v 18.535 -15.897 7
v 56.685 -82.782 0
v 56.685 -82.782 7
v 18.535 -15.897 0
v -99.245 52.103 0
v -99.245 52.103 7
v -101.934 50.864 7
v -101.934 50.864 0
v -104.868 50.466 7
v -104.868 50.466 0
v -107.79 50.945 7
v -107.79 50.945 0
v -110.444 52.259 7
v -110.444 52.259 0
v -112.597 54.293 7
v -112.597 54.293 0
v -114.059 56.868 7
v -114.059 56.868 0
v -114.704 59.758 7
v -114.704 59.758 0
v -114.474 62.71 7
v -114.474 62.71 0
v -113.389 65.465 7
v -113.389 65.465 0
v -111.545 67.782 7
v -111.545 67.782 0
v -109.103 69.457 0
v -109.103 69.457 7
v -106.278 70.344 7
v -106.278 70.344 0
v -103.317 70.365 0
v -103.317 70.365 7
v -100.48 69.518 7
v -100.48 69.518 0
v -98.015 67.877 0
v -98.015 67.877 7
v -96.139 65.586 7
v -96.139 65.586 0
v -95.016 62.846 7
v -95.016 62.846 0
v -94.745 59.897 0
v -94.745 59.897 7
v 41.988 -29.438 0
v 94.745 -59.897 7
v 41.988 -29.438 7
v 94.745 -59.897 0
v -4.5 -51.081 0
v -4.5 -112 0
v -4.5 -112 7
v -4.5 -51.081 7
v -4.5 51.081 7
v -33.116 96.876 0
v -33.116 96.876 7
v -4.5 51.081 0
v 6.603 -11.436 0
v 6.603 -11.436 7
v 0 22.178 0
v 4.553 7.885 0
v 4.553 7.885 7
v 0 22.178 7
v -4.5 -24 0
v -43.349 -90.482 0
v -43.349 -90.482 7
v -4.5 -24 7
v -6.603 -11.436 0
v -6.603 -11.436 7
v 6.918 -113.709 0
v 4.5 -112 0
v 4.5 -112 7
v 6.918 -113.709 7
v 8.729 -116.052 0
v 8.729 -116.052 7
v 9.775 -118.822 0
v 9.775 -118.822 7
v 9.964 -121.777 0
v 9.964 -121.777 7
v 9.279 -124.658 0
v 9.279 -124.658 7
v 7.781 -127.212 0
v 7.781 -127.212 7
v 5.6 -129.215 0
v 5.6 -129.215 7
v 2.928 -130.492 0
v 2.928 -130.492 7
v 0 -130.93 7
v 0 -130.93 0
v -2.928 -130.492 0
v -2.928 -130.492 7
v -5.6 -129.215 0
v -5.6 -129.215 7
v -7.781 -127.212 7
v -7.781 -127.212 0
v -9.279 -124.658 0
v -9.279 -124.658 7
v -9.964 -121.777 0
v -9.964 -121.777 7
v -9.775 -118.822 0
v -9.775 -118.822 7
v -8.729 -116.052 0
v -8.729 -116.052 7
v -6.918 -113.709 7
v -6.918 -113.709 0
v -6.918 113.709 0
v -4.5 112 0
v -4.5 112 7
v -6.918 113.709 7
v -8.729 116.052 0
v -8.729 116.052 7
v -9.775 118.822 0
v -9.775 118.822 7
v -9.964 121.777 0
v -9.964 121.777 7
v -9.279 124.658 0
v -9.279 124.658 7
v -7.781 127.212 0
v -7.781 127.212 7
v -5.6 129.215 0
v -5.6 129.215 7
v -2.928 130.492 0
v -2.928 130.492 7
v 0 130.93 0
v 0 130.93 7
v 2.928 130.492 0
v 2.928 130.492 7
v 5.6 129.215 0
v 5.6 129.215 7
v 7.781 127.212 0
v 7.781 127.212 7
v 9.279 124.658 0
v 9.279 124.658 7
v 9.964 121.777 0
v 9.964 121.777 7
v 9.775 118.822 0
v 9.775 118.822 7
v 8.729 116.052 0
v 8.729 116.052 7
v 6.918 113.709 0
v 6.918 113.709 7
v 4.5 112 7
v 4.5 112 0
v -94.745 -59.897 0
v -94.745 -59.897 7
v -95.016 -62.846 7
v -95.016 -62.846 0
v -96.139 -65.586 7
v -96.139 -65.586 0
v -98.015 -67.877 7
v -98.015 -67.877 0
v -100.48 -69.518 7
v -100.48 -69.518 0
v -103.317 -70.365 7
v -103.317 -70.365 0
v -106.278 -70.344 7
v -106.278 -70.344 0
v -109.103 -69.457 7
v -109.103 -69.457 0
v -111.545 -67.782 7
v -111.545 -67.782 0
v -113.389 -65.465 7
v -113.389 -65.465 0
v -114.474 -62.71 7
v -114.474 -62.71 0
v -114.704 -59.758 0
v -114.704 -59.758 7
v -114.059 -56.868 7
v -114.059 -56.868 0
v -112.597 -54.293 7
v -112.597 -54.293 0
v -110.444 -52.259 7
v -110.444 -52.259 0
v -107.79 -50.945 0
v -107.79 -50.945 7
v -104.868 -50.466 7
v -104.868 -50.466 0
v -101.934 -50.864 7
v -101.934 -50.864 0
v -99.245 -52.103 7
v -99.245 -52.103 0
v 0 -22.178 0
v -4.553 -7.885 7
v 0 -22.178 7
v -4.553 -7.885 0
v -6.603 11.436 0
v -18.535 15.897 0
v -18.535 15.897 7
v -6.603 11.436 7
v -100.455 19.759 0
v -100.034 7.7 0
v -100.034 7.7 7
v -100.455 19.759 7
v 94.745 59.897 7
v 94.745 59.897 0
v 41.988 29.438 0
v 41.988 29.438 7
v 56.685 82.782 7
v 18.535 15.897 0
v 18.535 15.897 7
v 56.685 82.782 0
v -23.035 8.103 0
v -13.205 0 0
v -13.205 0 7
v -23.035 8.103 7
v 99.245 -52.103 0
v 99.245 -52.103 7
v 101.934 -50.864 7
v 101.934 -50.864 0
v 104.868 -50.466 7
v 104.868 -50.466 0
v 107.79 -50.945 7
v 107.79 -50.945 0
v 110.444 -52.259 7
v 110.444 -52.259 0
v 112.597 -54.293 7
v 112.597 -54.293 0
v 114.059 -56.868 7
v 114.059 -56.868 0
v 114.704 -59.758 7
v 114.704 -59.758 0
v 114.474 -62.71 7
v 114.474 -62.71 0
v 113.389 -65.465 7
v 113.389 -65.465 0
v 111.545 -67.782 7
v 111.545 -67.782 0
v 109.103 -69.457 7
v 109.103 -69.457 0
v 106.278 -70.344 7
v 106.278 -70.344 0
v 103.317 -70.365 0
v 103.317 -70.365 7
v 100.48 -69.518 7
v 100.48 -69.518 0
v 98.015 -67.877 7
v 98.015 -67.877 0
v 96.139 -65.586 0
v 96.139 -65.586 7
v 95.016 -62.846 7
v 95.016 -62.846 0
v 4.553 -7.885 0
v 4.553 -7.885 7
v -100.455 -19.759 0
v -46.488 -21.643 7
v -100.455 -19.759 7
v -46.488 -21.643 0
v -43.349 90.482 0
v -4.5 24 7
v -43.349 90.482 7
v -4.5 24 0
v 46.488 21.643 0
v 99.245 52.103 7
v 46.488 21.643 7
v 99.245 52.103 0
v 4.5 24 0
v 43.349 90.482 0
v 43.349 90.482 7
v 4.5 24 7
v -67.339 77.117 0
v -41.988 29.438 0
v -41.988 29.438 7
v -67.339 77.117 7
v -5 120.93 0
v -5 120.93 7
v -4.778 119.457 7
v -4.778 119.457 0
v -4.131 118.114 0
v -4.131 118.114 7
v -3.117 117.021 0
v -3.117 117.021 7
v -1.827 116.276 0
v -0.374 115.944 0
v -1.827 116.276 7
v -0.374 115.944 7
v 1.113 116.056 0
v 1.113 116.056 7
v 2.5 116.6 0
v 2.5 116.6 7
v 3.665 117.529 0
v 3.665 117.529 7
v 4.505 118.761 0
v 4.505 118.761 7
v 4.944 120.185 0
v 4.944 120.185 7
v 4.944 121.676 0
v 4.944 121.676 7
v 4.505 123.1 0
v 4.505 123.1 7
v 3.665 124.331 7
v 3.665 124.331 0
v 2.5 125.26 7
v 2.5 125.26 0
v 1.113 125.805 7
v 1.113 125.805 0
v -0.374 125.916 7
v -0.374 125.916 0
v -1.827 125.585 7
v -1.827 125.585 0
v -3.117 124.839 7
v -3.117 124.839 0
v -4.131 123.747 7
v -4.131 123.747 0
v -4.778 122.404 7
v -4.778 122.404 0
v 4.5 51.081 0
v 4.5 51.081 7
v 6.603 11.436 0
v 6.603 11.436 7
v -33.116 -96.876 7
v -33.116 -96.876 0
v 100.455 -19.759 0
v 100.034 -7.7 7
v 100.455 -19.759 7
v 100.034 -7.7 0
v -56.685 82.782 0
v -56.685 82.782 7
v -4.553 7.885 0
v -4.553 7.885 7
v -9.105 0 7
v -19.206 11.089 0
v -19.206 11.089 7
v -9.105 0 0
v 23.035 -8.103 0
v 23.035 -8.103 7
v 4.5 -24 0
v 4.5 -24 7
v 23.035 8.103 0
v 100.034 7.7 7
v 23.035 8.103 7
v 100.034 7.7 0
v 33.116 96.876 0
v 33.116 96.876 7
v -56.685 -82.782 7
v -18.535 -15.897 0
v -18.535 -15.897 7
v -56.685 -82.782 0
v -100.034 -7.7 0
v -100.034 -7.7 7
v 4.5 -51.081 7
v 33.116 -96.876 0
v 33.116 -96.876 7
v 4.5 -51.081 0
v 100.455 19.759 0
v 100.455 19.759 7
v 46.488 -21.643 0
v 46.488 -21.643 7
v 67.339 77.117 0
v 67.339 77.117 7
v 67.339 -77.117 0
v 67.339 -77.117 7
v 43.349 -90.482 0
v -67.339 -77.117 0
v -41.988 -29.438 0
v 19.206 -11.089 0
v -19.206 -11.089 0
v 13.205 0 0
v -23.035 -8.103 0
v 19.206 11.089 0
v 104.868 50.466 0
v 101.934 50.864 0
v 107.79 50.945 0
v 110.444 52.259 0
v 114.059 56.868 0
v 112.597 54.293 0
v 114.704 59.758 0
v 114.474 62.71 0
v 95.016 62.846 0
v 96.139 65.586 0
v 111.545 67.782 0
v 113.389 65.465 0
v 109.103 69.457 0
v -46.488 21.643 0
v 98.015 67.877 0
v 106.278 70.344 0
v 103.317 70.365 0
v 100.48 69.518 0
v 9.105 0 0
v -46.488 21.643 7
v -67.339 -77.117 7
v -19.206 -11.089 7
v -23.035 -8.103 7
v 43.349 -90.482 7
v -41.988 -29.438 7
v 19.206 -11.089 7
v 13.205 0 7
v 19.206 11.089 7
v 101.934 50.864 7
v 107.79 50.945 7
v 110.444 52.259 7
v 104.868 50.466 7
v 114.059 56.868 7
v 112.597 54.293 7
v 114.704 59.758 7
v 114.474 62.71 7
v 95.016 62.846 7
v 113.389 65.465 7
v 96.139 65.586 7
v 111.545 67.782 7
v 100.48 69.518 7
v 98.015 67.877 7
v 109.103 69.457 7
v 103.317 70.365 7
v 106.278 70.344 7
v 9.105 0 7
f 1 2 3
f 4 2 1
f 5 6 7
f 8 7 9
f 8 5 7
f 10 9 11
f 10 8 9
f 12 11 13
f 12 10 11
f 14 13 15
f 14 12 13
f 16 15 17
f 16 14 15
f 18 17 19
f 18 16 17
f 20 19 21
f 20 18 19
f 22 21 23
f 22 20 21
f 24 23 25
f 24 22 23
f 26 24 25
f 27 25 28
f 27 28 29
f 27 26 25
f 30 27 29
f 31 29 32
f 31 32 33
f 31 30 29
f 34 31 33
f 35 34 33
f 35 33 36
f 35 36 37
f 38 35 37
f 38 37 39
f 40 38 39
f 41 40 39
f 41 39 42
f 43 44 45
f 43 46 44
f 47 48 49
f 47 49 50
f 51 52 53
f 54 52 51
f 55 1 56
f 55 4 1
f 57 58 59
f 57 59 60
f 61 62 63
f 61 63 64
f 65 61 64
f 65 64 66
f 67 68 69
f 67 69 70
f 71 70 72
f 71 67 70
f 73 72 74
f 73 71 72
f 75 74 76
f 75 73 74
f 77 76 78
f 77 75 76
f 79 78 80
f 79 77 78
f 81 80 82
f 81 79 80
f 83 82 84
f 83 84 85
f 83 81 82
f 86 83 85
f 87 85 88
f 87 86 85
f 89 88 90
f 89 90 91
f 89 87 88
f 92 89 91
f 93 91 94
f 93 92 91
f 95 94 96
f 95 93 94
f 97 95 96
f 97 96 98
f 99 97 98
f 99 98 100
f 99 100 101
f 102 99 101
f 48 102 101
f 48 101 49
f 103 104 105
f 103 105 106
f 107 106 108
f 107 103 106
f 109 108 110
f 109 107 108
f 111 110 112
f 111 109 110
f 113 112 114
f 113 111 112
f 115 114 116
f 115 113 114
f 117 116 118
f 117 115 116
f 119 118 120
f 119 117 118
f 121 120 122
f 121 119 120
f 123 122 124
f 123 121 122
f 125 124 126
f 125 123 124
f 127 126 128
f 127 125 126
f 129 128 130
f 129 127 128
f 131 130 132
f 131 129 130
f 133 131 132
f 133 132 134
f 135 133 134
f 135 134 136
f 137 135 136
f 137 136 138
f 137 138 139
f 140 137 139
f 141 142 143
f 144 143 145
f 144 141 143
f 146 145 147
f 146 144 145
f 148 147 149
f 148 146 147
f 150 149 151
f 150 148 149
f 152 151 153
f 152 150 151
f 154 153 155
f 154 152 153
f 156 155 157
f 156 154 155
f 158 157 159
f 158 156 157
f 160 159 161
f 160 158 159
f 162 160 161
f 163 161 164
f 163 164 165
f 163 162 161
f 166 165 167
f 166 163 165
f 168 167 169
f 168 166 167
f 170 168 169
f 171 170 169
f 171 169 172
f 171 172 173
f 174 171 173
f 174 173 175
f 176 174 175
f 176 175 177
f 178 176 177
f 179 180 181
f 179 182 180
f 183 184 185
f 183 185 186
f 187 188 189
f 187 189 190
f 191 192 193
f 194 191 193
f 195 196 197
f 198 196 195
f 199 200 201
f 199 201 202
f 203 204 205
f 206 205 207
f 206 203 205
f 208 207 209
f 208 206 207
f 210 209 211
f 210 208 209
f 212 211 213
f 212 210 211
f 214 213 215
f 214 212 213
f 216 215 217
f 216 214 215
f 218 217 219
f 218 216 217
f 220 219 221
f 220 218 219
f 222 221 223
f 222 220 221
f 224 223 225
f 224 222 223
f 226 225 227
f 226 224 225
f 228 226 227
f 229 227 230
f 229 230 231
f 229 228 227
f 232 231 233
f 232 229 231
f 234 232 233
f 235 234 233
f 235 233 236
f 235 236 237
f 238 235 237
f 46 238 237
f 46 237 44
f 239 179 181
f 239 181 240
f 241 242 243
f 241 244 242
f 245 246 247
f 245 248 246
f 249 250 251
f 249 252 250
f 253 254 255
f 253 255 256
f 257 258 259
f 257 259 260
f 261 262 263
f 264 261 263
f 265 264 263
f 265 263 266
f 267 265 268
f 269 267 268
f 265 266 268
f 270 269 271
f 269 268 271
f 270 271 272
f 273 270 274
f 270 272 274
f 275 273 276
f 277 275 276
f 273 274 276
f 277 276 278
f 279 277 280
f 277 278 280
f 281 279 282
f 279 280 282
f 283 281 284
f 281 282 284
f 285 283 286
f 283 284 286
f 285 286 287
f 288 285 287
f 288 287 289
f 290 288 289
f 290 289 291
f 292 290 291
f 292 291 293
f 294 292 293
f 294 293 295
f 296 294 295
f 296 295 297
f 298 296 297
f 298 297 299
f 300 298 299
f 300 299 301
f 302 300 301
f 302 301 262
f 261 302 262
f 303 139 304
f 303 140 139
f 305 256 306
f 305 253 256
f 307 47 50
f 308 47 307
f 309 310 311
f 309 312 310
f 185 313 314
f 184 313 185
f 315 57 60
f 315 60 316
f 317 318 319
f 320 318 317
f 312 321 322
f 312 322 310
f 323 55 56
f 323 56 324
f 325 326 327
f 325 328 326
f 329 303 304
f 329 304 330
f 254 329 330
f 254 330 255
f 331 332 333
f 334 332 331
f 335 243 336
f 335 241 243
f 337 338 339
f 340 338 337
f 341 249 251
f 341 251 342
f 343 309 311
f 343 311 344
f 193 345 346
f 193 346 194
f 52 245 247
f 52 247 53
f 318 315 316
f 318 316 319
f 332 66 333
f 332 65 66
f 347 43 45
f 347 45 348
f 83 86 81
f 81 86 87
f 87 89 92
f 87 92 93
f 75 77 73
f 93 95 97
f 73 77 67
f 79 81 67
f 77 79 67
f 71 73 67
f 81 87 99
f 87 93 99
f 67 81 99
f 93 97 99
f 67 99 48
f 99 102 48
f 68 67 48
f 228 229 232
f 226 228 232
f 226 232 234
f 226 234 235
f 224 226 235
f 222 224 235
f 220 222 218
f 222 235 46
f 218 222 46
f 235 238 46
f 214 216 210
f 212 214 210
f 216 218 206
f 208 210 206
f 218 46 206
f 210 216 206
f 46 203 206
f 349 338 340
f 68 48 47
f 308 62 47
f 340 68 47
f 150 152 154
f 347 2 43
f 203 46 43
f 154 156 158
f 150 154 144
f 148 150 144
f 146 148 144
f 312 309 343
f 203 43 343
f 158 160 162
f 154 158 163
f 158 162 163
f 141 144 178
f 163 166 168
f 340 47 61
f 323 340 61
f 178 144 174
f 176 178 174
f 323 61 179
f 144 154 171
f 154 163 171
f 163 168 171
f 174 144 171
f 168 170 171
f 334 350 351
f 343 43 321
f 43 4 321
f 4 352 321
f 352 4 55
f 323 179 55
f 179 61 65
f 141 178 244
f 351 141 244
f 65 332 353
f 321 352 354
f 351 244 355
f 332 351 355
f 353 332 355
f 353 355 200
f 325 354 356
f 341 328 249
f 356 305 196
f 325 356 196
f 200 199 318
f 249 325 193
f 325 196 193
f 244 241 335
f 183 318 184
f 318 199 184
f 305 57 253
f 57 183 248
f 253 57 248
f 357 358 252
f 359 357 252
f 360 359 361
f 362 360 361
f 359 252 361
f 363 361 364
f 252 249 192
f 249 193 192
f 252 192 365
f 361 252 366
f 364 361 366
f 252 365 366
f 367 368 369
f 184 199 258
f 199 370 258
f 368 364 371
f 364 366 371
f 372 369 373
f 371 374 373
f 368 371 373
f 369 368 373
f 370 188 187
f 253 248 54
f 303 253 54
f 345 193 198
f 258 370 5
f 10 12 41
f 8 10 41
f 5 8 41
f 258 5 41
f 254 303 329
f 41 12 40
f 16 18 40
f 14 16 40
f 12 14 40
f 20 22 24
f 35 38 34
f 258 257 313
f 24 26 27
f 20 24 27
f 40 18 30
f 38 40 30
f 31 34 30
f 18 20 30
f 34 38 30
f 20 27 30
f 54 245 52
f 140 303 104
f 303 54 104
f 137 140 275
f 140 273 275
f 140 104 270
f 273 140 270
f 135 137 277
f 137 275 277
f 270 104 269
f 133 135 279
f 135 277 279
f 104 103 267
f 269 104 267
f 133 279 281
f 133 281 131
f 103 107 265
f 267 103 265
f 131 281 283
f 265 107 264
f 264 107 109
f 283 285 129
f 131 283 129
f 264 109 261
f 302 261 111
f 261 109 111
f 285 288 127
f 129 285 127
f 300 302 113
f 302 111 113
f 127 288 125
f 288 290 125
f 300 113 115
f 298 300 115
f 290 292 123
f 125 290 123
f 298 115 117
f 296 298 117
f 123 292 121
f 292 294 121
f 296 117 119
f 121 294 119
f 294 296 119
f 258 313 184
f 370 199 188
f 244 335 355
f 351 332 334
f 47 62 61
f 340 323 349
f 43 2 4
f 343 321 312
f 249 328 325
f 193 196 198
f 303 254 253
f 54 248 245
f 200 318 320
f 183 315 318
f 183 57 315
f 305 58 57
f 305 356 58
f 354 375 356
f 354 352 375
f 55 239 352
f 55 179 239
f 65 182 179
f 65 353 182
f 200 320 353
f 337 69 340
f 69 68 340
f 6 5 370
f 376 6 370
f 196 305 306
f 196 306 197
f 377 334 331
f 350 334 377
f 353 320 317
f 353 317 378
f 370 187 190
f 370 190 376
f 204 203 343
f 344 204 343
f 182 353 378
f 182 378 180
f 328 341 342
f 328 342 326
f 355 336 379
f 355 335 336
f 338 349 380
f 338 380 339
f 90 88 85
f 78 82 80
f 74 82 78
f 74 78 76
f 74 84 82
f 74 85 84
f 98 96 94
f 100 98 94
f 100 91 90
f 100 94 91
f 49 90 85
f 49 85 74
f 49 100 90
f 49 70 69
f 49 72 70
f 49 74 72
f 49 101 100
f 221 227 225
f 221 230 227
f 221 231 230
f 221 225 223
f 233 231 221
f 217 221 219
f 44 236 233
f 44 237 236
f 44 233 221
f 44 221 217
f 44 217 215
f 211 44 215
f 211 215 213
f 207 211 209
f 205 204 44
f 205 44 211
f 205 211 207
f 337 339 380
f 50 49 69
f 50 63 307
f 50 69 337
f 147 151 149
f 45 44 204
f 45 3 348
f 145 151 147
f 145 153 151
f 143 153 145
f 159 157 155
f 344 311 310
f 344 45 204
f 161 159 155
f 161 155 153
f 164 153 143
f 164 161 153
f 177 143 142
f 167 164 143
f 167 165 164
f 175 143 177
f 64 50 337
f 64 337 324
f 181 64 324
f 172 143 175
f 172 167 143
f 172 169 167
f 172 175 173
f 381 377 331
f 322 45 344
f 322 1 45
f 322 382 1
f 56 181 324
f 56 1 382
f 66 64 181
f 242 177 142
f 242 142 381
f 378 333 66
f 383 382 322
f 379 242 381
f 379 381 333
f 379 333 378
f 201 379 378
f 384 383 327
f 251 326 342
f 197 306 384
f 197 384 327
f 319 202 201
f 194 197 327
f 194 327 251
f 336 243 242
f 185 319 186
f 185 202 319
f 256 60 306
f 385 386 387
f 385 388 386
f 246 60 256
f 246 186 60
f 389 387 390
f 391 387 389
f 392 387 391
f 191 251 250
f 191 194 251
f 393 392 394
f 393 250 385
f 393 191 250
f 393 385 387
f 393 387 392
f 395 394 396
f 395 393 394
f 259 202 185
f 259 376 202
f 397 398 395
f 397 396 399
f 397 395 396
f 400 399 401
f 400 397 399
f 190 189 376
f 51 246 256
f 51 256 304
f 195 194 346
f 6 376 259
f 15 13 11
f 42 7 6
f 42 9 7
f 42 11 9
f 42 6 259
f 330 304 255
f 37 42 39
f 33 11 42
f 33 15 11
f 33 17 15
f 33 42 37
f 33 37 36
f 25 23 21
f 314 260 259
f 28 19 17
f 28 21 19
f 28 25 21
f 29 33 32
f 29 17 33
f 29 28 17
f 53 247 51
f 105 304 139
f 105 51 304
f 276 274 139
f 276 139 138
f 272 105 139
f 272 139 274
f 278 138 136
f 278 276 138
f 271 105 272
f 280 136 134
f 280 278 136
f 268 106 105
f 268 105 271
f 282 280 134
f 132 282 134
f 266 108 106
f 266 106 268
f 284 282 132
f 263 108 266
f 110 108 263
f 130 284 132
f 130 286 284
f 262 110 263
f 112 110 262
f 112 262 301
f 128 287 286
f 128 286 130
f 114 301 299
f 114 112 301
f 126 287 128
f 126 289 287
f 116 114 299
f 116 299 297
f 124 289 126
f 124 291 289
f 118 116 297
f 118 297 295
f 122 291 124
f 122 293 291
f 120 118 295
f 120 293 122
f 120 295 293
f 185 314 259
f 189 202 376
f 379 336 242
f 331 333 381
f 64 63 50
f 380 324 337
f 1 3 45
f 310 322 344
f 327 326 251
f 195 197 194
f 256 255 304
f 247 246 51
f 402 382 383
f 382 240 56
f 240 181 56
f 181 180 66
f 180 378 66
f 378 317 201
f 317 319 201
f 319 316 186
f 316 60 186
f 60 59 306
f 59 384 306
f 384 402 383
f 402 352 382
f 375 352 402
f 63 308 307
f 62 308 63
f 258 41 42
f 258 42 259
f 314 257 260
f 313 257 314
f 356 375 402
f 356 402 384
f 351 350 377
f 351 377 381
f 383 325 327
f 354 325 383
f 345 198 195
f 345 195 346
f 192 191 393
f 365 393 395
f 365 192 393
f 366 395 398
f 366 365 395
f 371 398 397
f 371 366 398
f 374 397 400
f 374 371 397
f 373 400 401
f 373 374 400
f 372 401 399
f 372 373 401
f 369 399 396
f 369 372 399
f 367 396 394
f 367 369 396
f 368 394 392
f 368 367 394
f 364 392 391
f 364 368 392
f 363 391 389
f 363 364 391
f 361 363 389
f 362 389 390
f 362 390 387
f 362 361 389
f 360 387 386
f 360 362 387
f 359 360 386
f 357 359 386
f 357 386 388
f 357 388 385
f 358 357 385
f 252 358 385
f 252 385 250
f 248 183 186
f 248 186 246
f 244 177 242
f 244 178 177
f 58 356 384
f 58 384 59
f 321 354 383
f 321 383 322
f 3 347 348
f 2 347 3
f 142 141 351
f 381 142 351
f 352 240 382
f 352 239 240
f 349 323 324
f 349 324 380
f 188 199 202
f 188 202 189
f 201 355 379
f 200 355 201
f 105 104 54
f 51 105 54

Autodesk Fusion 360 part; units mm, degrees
sketch "Sketch1" plane through (0, 0, 0) normal (0, 0, 1) x (1, 0, 0)
  line L0 (-4.5, 24) -> (4.5, 24)
  line L1 (4.5, 112) -> (-4.5, 112)
  line L2 (-4.5, 112) -> (-4.5, 24)
  line L3 (0, 24) -> (0, 112) construction
  line L4 (4.5, 112) -> (4.5, 24)
  line L5 (0, 24) -> (0, 0) construction
  circle A0 centre (0, 120.9303) radius 10
  dimension "d517" = 9
  dimension "d518" = 88
  dimension "d519" = 24
  dimension "d520" = 20
extrude "Extrude1" add sketch "Sketch1" along normal blind 7 makes body 1
sketch "Sketch2" plane through (0, 0, 0) normal (0, 0, 1) x (1, 0, 0)
  arc A0 (4.5, 112) -> (-4.5, 112) centre (0, 120.9303) ccw construction
  line L0 (4.5, 112) -> (4.5, 24) construction
  line L1 (4.5, 24) -> (-4.5, 24) construction
  line L2 (-4.5, 24) -> (-4.5, 112) construction
  line L3 (4.5, 51.0811) -> (33.1156, 96.8757)
  line L4 (33.1156, 96.8757) -> (43.3486, 90.4815)
  line L5 (43.3486, 90.4815) -> (4.5, 24)
  line L6 (4.5, 24) -> (4.5, 51.0811)
  dimension "d525" = 54
  dimension "d526" = 32
  dimension "d527" = 1.7
  dimension "d528" = 77
extrude "Extrude2" add sketch "Sketch2" along normal up to surface (7 mm away) separate body makes body 2
mirror "Mirror1" about plane through (0, 0, 0) normal (1, 0, 0) of bodies 2 makes body 3
combine "Combine1" operation add target body 2 tool bodies 1 3
sketch "Sketch3" plane through (0, 0, 0) normal (0, 0, 1) x (1, 0, 0)
  line L0 (43.3486, 90.4815) -> (4.5, 24)
  line L1 (4.5, 24) -> (-4.5, 24)
  line L2 (-4.5, 24) -> (-43.3486, 90.4815)
  line L3 (-43.3486, 90.4815) -> (-33.1156, 96.8757)
  line L4 (-33.1156, 96.8757) -> (-4.5, 51.0811)
  line L5 (-4.5, 51.0811) -> (-4.5, 112)
  arc A0 (4.5, 112) -> (-4.5, 112) centre (0, 120.9303) ccw
  line L6 (4.5, 112) -> (4.5, 51.0811)
  line L7 (4.5, 51.0811) -> (33.1156, 96.8757)
  line L8 (33.1156, 96.8757) -> (43.3486, 90.4815)
  line L9 (4.5, 24) -> (6.6025, 11.4359)
  line L10 (6.6025, 11.4359) -> (4.5525, 7.8852)
  line L11 (4.5525, 7.8852) -> (0, 22.1776)
  line L12 (0, 22.1776) -> (-4.5525, 7.8852)
  line L13 (-4.5525, 7.8852) -> (-6.6025, 11.4359)
  line L14 (-6.6025, 11.4359) -> (-4.5, 24)
  line L15 (0, 1.75) -> (0, 22.5)
  line L16 (1.75, 0) -> (22.5, 0)
  dimension "d533" = 60
  dimension "d538" = 15
  dimension "d539" = 4.1
  dimension "d540" = 19
extrude "Extrude3" add sketch "Sketch3" along normal up to surface (7 mm away) separate body contours L1 L9 L10 L11 L12 L13 L14 makes body 4
pattern_circular "C-Pattern1" count 6 over 360 about axis through (0, 0, 1.75) along (0, 0, 1) of bodies 4 makes body 5 at (-14.7812, 12.8073, 0) makes body 6 at (-18.482, -6.3972, 0) makes body 7 at (-3.7008, -19.2045, 0) makes body 8 at (14.7812, -12.8073, 0) makes body 9 at (18.482, 6.3972, 0)
pattern_circular "C-Pattern2" count 6 over 360 about axis through (0, 0, 1.75) along (0, 0, 1) of bodies 2 makes body 10 at (-56.5186, 12.482, 0) makes body 11 at (-39.069, -42.7055, 0) makes body 12 at (17.4495, -55.1875, 0) makes body 13 at (56.5186, -12.482, 0) makes body 14 at (56.5186, 12.482, 0)
combine "Combine2" operation add target body 2 tool bodies 14 13 12 11 10 5 4 9 8 7 6
sketch "Sketch4" plane through (0, 0, 7) normal (0, 0, 1) x (-1, 0, 0)
  arc A0 (-4.5, -112) -> (4.5, -112) centre (0, -120.9303) ccw
  circle A1 centre (0, -120.9303) radius 5
  dimension "d543" = 10
extrude "Extrude4" cut sketch "Sketch4" against normal up to surface (7 mm away) bodies 2
equation "d526 = Angular Dimension-2"
equation "d527 = Angular Dimension-3"
equation "d533 = Angular Dimension-2"
equation "d540 = Angular Dimension-3"
